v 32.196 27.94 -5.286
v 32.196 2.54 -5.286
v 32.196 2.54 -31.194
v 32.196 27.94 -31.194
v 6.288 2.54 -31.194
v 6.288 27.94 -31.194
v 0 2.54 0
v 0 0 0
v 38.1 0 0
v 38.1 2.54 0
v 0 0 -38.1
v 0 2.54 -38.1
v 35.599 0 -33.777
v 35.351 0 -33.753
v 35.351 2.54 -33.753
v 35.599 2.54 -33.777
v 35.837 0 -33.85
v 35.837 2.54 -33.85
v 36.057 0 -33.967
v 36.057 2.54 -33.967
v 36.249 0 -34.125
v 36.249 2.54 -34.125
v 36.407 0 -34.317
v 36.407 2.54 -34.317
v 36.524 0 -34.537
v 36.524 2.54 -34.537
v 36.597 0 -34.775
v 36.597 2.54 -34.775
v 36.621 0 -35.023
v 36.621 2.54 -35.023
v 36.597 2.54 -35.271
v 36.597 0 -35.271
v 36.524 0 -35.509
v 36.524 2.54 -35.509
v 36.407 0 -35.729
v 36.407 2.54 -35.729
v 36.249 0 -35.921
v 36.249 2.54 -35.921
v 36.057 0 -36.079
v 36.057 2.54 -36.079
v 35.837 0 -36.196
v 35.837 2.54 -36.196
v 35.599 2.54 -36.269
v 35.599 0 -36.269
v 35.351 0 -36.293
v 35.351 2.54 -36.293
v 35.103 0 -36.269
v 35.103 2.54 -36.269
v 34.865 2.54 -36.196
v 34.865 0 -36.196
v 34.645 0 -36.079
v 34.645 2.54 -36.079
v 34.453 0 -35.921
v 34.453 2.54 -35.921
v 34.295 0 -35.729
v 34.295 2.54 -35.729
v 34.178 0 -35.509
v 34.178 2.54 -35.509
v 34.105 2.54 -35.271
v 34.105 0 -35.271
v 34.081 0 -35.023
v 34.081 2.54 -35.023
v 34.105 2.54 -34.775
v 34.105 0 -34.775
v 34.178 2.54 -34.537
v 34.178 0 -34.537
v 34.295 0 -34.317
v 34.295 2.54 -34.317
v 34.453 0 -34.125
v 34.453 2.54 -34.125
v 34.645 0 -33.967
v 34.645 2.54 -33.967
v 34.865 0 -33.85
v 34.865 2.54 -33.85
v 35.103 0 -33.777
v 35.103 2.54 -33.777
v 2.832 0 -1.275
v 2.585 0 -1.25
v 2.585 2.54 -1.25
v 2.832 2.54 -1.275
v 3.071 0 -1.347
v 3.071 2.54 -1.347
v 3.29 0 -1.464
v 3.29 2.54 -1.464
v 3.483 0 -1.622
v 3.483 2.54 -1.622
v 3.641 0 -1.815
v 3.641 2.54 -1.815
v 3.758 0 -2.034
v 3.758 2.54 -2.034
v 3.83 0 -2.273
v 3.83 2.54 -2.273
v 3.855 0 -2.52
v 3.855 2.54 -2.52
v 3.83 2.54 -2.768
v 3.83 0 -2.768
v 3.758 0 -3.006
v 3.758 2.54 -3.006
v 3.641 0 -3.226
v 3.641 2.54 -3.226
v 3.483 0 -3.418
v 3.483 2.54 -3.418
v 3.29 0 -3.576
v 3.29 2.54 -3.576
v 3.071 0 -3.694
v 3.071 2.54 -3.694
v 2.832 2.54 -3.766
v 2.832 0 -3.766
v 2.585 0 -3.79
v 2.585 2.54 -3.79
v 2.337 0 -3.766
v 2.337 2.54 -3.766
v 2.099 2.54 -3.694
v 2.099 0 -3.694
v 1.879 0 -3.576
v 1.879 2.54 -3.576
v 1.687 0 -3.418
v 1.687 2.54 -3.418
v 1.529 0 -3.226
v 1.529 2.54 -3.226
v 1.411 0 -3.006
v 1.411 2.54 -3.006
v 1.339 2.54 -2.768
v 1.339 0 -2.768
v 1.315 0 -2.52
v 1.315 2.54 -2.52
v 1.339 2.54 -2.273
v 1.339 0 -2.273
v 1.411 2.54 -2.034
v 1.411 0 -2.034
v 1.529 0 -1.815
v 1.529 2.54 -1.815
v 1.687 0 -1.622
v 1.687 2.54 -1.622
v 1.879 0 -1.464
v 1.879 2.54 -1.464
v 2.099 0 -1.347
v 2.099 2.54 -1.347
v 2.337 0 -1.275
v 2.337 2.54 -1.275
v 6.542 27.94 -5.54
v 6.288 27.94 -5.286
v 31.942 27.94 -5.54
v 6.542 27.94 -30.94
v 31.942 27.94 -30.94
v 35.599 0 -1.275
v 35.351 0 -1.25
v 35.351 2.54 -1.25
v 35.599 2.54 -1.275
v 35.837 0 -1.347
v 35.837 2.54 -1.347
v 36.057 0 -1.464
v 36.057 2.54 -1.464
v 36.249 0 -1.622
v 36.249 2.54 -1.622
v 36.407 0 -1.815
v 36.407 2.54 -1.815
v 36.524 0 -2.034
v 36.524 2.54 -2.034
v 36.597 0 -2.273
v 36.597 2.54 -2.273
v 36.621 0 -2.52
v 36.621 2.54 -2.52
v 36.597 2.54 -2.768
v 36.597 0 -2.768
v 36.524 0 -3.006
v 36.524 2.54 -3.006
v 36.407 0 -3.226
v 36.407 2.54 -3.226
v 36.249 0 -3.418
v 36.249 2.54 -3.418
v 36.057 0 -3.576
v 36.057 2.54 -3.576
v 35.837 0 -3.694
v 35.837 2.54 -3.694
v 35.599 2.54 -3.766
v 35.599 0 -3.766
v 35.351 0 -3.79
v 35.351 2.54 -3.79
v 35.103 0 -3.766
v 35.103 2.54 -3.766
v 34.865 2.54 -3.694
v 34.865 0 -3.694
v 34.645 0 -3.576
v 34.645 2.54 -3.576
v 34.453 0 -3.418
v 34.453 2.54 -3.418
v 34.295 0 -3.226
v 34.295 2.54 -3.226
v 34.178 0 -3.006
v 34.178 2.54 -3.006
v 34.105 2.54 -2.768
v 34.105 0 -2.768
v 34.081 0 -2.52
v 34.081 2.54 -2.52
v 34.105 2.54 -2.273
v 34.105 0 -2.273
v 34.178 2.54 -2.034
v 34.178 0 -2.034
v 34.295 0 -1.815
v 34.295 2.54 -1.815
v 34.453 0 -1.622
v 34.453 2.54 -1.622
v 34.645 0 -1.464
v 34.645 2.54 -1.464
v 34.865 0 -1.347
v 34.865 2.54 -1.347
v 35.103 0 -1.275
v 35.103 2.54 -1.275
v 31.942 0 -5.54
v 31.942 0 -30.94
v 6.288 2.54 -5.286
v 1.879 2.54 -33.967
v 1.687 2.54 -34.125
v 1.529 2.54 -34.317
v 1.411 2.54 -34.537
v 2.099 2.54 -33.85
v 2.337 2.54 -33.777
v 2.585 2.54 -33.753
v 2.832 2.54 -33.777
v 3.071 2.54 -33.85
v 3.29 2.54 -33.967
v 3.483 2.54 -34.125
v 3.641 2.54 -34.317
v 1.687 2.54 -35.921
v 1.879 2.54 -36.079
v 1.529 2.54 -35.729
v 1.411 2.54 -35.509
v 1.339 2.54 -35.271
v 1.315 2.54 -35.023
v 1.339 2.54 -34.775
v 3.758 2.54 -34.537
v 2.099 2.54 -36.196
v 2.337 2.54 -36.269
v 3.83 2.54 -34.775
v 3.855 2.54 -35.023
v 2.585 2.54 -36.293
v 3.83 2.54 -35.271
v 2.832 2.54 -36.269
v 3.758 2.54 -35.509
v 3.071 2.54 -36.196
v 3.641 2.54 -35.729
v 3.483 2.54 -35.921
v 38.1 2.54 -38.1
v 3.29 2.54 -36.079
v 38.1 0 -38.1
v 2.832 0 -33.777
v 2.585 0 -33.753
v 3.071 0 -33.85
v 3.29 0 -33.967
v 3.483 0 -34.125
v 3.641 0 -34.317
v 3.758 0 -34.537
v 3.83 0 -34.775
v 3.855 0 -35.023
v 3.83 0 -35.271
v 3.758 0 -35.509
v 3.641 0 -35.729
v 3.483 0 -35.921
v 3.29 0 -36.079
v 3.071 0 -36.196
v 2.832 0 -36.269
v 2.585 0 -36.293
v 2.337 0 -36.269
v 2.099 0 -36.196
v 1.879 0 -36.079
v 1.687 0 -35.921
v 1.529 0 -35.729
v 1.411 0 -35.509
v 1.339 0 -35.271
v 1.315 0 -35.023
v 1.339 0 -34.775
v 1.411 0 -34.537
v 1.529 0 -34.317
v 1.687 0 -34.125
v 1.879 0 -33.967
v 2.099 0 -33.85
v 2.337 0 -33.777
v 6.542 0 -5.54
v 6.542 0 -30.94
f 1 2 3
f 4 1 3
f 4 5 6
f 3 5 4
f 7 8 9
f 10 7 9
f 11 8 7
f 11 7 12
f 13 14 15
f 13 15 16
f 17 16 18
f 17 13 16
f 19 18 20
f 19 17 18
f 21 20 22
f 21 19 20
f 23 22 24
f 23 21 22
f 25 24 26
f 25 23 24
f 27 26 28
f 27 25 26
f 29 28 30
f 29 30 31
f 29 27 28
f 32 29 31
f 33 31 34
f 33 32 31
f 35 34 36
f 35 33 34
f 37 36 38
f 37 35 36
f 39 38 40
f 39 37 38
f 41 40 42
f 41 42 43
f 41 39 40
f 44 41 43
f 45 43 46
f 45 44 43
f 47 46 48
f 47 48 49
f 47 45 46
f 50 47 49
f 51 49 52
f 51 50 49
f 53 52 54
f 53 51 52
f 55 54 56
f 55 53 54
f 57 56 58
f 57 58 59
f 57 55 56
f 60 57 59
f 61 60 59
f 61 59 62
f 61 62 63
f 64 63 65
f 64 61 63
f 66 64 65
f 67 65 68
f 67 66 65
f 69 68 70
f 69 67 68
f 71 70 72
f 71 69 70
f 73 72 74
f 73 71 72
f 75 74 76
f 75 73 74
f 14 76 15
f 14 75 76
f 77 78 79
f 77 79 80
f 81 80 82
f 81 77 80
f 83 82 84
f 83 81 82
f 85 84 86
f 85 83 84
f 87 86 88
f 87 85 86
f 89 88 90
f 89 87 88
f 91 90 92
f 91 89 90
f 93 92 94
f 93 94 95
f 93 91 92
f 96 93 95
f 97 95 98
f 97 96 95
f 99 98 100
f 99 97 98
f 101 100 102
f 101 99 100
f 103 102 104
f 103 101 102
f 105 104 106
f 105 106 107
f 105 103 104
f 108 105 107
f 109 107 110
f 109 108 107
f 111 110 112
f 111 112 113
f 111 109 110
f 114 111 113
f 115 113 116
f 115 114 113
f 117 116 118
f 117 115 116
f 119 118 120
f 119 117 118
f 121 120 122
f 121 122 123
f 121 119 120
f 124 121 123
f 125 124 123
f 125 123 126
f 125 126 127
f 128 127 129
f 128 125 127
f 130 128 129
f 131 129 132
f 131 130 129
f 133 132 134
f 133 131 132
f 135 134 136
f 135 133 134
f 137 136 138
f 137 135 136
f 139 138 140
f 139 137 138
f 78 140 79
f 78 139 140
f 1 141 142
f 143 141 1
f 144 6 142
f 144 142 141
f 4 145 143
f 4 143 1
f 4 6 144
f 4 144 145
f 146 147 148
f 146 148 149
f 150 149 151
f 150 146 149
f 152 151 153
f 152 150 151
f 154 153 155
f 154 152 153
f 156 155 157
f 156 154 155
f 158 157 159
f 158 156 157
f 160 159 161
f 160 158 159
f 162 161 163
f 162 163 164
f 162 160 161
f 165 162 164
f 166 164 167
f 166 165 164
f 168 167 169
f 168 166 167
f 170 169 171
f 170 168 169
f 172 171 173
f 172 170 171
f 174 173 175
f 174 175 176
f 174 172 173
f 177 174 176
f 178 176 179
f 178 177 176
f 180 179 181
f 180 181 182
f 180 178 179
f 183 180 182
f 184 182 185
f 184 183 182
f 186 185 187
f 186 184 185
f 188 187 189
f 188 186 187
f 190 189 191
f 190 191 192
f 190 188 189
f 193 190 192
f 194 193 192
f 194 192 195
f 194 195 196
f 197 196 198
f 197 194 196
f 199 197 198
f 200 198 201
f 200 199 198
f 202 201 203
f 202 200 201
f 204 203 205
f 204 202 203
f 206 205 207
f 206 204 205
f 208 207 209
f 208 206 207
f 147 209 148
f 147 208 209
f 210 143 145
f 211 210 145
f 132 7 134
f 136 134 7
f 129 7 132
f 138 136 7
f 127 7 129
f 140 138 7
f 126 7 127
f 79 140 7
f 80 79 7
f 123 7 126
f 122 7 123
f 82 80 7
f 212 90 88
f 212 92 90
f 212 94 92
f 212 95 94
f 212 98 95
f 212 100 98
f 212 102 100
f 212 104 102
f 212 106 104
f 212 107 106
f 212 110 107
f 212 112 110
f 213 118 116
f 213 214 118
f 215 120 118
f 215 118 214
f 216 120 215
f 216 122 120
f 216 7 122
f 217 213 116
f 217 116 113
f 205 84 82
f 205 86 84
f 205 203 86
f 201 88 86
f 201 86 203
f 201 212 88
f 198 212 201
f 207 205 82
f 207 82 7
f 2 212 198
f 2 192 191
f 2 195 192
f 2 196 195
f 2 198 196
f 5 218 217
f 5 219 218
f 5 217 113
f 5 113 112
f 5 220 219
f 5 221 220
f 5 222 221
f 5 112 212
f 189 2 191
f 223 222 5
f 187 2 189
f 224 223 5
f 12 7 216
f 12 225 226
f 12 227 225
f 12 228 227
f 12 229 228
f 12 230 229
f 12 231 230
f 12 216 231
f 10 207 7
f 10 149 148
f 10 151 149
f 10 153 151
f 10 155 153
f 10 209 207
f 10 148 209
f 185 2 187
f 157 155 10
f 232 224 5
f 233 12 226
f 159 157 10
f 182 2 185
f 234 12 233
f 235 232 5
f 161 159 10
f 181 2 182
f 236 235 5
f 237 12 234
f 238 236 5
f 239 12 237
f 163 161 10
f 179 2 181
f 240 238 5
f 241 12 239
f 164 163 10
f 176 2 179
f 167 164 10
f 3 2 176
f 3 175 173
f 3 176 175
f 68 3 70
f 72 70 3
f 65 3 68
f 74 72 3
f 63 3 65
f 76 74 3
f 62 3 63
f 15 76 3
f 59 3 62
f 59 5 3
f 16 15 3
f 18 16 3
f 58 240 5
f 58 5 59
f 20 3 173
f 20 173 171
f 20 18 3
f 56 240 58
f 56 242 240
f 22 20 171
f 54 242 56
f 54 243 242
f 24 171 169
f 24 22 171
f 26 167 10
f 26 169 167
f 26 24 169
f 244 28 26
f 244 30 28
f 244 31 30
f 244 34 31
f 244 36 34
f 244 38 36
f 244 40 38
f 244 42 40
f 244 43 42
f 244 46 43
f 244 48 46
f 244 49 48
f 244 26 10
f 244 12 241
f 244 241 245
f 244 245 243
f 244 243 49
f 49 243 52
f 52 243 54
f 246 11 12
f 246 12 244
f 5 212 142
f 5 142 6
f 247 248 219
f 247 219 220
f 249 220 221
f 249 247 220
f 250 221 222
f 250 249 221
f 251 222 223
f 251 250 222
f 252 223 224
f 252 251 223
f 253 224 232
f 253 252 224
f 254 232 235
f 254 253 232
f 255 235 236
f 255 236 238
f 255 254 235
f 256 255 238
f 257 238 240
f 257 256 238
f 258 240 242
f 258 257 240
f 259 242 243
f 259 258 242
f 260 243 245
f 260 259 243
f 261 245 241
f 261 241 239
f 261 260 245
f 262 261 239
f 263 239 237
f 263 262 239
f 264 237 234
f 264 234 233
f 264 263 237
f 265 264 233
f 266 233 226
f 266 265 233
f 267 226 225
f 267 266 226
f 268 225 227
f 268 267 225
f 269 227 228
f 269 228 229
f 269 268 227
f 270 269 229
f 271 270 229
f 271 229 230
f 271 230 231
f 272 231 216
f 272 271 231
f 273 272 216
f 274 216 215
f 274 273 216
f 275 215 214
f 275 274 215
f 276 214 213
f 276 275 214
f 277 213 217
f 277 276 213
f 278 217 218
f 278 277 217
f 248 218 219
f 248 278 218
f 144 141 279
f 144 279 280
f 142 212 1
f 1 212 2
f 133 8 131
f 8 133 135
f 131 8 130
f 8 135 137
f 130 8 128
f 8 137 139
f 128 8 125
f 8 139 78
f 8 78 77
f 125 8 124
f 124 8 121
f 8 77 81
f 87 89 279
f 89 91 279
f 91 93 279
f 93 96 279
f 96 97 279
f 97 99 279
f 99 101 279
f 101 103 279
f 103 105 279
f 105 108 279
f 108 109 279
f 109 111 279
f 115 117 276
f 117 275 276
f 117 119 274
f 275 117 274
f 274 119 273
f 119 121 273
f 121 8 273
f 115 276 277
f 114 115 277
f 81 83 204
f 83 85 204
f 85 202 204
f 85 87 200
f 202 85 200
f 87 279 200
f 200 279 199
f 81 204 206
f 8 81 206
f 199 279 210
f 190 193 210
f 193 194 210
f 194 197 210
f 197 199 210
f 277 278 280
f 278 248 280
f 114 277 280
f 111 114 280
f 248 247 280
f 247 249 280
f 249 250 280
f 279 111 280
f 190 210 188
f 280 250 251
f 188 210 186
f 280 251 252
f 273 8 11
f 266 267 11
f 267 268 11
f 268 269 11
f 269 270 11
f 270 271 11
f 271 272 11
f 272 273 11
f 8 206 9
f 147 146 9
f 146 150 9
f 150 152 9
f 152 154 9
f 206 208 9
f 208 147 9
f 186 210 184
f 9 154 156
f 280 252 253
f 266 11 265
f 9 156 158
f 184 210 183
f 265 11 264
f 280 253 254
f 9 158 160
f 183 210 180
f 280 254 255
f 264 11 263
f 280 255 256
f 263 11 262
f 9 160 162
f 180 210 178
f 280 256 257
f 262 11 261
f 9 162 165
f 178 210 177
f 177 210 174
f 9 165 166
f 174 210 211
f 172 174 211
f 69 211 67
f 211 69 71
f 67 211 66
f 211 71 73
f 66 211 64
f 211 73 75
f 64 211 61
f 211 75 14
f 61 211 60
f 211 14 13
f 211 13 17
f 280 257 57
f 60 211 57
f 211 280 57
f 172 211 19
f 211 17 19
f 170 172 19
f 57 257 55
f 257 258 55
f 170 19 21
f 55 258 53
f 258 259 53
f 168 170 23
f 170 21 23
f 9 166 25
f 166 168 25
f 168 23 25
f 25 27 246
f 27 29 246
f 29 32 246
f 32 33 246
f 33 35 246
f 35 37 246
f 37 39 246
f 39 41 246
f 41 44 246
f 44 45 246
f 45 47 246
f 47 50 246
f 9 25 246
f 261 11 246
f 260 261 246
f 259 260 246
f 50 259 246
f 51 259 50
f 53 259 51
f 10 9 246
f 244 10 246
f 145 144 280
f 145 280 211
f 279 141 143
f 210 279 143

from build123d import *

# Parameters (mm, degrees)
SKETCH1_W           = 38.1
SKETCH1_H           = 38.1
SKETCH1_R           = 1.27
SKETCH1_W_2         = 25.4
SKETCH1_H_2         = 25.4
BOSS_EXTRUDE2_DEPTH = 2.54
SKETCH3_W           = 25.908
SKETCH3_H           = 25.908
SKETCH3_W_2         = 25.4
SKETCH3_H_2         = 25.4
BOSS_EXTRUDE4_DEPTH = 25.4


with BuildPart() as part:
    # Sketch1 → Boss-Extrude2 (new body)
    with BuildSketch(Plane(origin=(0, 0, 0), x_dir=(1, 0, 0), z_dir=(0, 1, 0))):
        with Locations((19.05, 19.05)):
            Rectangle(SKETCH1_W, SKETCH1_H)
        with Locations(Location((2.584718537, 35.02298259, 0), (0, 0, 270))):
            Circle(SKETCH1_R, mode=Mode.SUBTRACT)
        with Locations(Location((35.350956252, 35.02298259, 0), (0, 0, 270))):
            Circle(SKETCH1_R, mode=Mode.SUBTRACT)
        with Locations(Location((2.584718537, 2.5204018, 0), (0, 0, 270))):
            Circle(SKETCH1_R, mode=Mode.SUBTRACT)
        with Locations(Location((35.350956252, 2.5204018, 0), (0, 0, 270))):
            Circle(SKETCH1_R, mode=Mode.SUBTRACT)
        with Locations((19.241768868, 18.2395028)):
            Rectangle(SKETCH1_W_2, SKETCH1_H_2, mode=Mode.SUBTRACT)
    extrude(amount=BOSS_EXTRUDE2_DEPTH)

    # Sketch3 → Boss-Extrude4 (add)
    with BuildSketch(Plane(origin=(0, 2.54, 0), x_dir=(1, 0, 0), z_dir=(0, 1, 0))):
        with Locations((19.241768868, 18.2395028)):
            Rectangle(SKETCH3_W, SKETCH3_H)
        with Locations((19.241768868, 18.2395028)):
            Rectangle(SKETCH3_W_2, SKETCH3_H_2, mode=Mode.SUBTRACT)
    extrude(amount=BOSS_EXTRUDE4_DEPTH)


solid = part.part
